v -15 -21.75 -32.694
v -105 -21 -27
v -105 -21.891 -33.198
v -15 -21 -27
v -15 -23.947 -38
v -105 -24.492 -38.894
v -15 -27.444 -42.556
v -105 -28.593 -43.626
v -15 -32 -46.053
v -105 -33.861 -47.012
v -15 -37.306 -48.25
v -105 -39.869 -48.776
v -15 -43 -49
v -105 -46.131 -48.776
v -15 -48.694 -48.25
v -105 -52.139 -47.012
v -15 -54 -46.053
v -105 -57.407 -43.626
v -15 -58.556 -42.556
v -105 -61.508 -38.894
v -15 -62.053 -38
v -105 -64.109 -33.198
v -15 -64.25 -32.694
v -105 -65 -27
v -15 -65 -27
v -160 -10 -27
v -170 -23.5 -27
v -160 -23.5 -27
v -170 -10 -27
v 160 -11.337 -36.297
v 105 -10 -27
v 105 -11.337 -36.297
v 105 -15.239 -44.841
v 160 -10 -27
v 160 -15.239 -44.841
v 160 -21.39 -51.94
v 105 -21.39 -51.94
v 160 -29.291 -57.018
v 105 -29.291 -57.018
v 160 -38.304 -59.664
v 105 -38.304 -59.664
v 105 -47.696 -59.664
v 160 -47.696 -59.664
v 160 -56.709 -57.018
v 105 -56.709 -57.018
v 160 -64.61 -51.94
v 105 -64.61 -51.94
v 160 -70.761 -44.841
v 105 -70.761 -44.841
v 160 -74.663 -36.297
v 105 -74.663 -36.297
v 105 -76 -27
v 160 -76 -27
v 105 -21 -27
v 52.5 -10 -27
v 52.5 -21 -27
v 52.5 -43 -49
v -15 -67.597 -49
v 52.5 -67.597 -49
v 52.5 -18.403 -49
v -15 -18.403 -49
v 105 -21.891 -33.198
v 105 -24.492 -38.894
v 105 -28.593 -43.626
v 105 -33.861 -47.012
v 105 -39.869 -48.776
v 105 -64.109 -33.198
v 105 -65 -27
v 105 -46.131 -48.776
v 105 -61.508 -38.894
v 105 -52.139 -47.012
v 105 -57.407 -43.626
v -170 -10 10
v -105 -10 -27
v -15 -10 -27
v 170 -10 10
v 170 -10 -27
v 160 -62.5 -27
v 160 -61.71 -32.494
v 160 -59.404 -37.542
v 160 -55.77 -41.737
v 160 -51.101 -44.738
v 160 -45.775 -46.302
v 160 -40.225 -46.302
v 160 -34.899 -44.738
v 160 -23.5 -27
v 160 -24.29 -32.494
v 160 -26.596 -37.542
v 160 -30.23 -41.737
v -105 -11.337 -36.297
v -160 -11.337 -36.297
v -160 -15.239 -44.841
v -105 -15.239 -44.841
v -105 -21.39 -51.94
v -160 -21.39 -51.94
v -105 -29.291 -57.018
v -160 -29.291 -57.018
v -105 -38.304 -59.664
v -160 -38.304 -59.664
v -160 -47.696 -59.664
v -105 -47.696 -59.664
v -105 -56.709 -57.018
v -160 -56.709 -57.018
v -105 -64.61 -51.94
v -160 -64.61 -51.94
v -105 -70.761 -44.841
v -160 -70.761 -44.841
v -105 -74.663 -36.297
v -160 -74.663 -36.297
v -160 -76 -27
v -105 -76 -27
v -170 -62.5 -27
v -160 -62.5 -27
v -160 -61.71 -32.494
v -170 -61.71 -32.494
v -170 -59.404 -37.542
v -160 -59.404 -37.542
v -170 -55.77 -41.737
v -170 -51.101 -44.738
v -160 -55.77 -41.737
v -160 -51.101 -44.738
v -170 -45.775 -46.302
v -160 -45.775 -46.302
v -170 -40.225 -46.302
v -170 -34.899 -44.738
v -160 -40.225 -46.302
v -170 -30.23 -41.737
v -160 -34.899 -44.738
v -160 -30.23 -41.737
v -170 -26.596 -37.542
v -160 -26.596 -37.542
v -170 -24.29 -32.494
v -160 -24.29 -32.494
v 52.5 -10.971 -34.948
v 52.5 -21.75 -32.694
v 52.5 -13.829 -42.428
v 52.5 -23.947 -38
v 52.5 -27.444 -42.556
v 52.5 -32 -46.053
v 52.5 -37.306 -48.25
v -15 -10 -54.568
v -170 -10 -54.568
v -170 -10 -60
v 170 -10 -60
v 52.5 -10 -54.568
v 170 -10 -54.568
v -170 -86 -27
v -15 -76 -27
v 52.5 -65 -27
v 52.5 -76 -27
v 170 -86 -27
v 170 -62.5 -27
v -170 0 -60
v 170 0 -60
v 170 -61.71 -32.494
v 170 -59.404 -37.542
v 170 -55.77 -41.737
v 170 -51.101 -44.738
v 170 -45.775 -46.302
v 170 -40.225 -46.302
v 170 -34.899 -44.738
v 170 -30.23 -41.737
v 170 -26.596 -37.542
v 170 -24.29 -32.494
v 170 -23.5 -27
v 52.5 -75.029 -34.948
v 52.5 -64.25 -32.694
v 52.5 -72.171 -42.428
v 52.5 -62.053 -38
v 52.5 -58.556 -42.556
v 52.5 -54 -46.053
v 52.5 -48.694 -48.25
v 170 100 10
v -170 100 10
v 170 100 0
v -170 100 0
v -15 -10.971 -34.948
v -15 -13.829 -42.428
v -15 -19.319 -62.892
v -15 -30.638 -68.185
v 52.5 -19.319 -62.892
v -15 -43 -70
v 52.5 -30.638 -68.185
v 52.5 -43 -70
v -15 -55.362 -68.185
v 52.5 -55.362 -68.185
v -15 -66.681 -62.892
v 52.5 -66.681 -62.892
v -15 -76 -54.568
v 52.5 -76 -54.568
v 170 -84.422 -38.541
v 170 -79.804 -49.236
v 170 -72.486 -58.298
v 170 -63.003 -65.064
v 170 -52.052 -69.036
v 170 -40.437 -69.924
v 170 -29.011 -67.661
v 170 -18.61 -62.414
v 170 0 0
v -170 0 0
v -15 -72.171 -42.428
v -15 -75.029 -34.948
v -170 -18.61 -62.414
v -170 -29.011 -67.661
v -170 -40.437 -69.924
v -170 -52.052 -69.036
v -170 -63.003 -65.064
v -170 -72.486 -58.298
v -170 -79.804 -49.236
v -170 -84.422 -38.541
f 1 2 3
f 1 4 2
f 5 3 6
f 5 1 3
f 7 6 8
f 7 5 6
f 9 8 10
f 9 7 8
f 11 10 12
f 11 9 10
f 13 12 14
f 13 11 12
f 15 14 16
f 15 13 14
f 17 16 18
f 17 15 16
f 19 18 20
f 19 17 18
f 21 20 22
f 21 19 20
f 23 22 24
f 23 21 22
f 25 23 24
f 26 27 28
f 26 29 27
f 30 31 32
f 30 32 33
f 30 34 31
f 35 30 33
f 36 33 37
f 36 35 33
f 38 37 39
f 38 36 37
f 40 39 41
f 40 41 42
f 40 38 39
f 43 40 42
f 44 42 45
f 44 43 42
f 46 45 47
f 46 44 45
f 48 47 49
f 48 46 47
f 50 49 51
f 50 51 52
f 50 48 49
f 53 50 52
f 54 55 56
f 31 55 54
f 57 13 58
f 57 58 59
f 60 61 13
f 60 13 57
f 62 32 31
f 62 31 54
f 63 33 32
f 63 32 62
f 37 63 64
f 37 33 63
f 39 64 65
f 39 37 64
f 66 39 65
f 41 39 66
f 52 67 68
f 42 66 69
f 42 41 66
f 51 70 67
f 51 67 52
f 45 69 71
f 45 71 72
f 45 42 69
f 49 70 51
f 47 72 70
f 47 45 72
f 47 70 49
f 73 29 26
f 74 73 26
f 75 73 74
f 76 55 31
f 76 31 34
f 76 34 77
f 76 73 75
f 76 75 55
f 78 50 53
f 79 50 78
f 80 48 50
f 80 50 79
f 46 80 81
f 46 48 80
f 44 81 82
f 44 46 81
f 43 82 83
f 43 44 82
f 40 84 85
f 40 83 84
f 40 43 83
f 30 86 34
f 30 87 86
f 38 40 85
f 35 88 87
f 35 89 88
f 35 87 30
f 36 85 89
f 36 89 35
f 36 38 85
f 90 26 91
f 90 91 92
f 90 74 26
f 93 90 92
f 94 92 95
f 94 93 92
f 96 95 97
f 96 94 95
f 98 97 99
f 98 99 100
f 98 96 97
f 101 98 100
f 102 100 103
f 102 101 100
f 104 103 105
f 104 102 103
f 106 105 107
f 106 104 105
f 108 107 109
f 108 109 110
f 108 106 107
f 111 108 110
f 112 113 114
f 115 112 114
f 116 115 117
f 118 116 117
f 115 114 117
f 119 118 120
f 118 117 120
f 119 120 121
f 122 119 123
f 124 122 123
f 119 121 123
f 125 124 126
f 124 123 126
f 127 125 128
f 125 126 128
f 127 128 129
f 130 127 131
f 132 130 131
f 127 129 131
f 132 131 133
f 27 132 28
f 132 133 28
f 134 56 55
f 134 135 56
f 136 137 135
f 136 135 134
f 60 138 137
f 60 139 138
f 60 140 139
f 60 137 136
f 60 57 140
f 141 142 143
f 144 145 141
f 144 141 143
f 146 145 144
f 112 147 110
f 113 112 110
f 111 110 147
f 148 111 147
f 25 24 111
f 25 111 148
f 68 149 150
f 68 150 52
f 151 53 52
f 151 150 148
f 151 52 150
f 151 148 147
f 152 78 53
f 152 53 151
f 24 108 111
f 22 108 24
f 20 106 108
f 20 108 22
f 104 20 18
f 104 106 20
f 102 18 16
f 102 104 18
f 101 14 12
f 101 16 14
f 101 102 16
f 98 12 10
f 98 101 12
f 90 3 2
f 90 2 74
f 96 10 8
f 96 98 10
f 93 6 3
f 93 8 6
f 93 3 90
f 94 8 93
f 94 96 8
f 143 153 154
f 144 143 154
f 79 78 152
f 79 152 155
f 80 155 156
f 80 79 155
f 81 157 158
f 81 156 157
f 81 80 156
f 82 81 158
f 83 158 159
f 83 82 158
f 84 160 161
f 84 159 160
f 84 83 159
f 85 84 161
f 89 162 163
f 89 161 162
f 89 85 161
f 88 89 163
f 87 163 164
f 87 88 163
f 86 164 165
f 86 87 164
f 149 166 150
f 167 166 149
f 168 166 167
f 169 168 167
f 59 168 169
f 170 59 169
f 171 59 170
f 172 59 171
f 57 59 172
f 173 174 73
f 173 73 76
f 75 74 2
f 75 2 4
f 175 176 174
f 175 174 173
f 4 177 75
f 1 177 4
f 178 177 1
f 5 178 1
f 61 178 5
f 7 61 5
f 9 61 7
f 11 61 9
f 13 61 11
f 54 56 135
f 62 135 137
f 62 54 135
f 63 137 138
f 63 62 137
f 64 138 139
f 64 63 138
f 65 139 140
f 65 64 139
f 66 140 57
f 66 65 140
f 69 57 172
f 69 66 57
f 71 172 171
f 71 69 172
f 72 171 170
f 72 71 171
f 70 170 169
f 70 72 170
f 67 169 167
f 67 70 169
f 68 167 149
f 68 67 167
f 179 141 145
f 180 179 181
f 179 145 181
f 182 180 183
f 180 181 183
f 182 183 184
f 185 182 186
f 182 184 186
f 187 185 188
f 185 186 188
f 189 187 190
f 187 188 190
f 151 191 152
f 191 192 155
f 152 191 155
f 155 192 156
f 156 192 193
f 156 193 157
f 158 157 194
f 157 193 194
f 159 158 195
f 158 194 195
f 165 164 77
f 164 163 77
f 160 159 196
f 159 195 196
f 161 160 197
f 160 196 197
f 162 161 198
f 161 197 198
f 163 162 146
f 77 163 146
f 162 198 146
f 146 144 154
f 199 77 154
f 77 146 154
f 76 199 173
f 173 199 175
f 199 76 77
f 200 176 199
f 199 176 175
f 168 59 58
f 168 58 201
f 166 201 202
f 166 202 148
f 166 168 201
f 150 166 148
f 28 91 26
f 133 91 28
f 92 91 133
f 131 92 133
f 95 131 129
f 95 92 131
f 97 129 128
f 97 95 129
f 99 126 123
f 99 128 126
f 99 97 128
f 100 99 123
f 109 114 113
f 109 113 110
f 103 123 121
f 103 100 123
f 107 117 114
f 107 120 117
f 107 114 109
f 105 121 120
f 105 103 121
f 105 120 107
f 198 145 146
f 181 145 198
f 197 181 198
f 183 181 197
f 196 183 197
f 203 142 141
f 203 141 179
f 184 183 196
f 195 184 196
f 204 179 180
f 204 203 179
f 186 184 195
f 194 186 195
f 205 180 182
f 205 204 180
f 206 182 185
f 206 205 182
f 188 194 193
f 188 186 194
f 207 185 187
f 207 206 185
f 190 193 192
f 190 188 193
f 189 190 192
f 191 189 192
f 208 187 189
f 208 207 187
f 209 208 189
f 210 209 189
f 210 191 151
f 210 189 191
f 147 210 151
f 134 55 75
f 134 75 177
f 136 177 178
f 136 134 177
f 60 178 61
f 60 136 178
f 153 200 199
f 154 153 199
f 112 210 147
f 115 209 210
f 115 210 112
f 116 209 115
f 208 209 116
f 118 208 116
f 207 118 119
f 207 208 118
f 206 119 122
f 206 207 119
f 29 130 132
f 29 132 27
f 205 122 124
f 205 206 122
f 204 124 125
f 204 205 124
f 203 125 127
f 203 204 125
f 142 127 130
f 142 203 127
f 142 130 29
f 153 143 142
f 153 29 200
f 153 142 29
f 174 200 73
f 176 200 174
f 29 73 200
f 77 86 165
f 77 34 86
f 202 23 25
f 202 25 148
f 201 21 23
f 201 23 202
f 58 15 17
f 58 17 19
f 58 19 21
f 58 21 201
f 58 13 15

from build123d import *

# Parameters (mm, degrees)
F0_W      = 340
F0_H      = 70
F1_DEPTH  = 10
F2_W      = 340
F2_H      = 100
F3_DEPTH  = 10
F7_ANGLE  = 180
F8_R      = 19.5
F9_DEPTH  = 170.001
F10_DEPTH = 170.001
F12_W     = 67.5
F12_H     = 66
F13_DEPTH = 25
F15_DEPTH = 222.501


with BuildPart() as f1:
    # F0 (on Front) → F1 (new body)
    with BuildSketch(Plane.XZ):
        with Locations((0, -25)):
            Rectangle(F0_W, F0_H)
    extrude(amount=F1_DEPTH)

    # F2 (on Top) → F3 (join)
    with BuildSketch(Plane.XY):
        with Locations((0, 50)):
            Rectangle(F2_W, F2_H)
    extrude(amount=F3_DEPTH)

    # F5 (on offset) → F7 (revolve)
    with BuildSketch(Plane.XY.offset(-27)):
        Polygon((170, 0), (-170, 0), (-170, -43), (-160, -43), (-160, -10), (-105, -10), (-105, -21), (-15, -21), (-15, -10), (52.5, -10), (52.5, -21), (105, -21), (105, -10), (160, -10), (160, -43), (170, -43), align=None)
    revolve(axis=Axis((0, -43, -27), (-1, 0, 0)), revolution_arc=F7_ANGLE)

    # F8 (on Right) → F9 (cut, through all)
    with BuildSketch(Plane.YZ):
        with Locations((-43, -27)):
            Circle(F8_R)
    extrude(amount=F9_DEPTH, mode=Mode.SUBTRACT)

    # F8 (on Right) → F10 (cut, through all)
    with BuildSketch(Plane.YZ):
        with Locations((-43, -27)):
            Circle(F8_R)
    extrude(amount=-F10_DEPTH, mode=Mode.SUBTRACT)

    # F12 (on offset) → F13 (join)
    with BuildSketch(Plane.XY.offset(-49)):
        with Locations((18.75, -43)):
            Rectangle(F12_W, F12_H)
    extrude(amount=-F13_DEPTH)

    # F14 (on face) → F15 (cut, through all)
    with BuildSketch(Plane.YZ.offset(52.5)):
        with BuildLine():
            ThreePointArc((-10, -54.568098), (-43, -70), (-76, -54.568098))
            Line((-76, -54.568098), (-76, -74))
            Line((-76, -74), (-10, -74))
            Line((-10, -74), (-10, -54.568098))
        make_face()
    extrude(amount=-F15_DEPTH, mode=Mode.SUBTRACT)


solid = f1.part
